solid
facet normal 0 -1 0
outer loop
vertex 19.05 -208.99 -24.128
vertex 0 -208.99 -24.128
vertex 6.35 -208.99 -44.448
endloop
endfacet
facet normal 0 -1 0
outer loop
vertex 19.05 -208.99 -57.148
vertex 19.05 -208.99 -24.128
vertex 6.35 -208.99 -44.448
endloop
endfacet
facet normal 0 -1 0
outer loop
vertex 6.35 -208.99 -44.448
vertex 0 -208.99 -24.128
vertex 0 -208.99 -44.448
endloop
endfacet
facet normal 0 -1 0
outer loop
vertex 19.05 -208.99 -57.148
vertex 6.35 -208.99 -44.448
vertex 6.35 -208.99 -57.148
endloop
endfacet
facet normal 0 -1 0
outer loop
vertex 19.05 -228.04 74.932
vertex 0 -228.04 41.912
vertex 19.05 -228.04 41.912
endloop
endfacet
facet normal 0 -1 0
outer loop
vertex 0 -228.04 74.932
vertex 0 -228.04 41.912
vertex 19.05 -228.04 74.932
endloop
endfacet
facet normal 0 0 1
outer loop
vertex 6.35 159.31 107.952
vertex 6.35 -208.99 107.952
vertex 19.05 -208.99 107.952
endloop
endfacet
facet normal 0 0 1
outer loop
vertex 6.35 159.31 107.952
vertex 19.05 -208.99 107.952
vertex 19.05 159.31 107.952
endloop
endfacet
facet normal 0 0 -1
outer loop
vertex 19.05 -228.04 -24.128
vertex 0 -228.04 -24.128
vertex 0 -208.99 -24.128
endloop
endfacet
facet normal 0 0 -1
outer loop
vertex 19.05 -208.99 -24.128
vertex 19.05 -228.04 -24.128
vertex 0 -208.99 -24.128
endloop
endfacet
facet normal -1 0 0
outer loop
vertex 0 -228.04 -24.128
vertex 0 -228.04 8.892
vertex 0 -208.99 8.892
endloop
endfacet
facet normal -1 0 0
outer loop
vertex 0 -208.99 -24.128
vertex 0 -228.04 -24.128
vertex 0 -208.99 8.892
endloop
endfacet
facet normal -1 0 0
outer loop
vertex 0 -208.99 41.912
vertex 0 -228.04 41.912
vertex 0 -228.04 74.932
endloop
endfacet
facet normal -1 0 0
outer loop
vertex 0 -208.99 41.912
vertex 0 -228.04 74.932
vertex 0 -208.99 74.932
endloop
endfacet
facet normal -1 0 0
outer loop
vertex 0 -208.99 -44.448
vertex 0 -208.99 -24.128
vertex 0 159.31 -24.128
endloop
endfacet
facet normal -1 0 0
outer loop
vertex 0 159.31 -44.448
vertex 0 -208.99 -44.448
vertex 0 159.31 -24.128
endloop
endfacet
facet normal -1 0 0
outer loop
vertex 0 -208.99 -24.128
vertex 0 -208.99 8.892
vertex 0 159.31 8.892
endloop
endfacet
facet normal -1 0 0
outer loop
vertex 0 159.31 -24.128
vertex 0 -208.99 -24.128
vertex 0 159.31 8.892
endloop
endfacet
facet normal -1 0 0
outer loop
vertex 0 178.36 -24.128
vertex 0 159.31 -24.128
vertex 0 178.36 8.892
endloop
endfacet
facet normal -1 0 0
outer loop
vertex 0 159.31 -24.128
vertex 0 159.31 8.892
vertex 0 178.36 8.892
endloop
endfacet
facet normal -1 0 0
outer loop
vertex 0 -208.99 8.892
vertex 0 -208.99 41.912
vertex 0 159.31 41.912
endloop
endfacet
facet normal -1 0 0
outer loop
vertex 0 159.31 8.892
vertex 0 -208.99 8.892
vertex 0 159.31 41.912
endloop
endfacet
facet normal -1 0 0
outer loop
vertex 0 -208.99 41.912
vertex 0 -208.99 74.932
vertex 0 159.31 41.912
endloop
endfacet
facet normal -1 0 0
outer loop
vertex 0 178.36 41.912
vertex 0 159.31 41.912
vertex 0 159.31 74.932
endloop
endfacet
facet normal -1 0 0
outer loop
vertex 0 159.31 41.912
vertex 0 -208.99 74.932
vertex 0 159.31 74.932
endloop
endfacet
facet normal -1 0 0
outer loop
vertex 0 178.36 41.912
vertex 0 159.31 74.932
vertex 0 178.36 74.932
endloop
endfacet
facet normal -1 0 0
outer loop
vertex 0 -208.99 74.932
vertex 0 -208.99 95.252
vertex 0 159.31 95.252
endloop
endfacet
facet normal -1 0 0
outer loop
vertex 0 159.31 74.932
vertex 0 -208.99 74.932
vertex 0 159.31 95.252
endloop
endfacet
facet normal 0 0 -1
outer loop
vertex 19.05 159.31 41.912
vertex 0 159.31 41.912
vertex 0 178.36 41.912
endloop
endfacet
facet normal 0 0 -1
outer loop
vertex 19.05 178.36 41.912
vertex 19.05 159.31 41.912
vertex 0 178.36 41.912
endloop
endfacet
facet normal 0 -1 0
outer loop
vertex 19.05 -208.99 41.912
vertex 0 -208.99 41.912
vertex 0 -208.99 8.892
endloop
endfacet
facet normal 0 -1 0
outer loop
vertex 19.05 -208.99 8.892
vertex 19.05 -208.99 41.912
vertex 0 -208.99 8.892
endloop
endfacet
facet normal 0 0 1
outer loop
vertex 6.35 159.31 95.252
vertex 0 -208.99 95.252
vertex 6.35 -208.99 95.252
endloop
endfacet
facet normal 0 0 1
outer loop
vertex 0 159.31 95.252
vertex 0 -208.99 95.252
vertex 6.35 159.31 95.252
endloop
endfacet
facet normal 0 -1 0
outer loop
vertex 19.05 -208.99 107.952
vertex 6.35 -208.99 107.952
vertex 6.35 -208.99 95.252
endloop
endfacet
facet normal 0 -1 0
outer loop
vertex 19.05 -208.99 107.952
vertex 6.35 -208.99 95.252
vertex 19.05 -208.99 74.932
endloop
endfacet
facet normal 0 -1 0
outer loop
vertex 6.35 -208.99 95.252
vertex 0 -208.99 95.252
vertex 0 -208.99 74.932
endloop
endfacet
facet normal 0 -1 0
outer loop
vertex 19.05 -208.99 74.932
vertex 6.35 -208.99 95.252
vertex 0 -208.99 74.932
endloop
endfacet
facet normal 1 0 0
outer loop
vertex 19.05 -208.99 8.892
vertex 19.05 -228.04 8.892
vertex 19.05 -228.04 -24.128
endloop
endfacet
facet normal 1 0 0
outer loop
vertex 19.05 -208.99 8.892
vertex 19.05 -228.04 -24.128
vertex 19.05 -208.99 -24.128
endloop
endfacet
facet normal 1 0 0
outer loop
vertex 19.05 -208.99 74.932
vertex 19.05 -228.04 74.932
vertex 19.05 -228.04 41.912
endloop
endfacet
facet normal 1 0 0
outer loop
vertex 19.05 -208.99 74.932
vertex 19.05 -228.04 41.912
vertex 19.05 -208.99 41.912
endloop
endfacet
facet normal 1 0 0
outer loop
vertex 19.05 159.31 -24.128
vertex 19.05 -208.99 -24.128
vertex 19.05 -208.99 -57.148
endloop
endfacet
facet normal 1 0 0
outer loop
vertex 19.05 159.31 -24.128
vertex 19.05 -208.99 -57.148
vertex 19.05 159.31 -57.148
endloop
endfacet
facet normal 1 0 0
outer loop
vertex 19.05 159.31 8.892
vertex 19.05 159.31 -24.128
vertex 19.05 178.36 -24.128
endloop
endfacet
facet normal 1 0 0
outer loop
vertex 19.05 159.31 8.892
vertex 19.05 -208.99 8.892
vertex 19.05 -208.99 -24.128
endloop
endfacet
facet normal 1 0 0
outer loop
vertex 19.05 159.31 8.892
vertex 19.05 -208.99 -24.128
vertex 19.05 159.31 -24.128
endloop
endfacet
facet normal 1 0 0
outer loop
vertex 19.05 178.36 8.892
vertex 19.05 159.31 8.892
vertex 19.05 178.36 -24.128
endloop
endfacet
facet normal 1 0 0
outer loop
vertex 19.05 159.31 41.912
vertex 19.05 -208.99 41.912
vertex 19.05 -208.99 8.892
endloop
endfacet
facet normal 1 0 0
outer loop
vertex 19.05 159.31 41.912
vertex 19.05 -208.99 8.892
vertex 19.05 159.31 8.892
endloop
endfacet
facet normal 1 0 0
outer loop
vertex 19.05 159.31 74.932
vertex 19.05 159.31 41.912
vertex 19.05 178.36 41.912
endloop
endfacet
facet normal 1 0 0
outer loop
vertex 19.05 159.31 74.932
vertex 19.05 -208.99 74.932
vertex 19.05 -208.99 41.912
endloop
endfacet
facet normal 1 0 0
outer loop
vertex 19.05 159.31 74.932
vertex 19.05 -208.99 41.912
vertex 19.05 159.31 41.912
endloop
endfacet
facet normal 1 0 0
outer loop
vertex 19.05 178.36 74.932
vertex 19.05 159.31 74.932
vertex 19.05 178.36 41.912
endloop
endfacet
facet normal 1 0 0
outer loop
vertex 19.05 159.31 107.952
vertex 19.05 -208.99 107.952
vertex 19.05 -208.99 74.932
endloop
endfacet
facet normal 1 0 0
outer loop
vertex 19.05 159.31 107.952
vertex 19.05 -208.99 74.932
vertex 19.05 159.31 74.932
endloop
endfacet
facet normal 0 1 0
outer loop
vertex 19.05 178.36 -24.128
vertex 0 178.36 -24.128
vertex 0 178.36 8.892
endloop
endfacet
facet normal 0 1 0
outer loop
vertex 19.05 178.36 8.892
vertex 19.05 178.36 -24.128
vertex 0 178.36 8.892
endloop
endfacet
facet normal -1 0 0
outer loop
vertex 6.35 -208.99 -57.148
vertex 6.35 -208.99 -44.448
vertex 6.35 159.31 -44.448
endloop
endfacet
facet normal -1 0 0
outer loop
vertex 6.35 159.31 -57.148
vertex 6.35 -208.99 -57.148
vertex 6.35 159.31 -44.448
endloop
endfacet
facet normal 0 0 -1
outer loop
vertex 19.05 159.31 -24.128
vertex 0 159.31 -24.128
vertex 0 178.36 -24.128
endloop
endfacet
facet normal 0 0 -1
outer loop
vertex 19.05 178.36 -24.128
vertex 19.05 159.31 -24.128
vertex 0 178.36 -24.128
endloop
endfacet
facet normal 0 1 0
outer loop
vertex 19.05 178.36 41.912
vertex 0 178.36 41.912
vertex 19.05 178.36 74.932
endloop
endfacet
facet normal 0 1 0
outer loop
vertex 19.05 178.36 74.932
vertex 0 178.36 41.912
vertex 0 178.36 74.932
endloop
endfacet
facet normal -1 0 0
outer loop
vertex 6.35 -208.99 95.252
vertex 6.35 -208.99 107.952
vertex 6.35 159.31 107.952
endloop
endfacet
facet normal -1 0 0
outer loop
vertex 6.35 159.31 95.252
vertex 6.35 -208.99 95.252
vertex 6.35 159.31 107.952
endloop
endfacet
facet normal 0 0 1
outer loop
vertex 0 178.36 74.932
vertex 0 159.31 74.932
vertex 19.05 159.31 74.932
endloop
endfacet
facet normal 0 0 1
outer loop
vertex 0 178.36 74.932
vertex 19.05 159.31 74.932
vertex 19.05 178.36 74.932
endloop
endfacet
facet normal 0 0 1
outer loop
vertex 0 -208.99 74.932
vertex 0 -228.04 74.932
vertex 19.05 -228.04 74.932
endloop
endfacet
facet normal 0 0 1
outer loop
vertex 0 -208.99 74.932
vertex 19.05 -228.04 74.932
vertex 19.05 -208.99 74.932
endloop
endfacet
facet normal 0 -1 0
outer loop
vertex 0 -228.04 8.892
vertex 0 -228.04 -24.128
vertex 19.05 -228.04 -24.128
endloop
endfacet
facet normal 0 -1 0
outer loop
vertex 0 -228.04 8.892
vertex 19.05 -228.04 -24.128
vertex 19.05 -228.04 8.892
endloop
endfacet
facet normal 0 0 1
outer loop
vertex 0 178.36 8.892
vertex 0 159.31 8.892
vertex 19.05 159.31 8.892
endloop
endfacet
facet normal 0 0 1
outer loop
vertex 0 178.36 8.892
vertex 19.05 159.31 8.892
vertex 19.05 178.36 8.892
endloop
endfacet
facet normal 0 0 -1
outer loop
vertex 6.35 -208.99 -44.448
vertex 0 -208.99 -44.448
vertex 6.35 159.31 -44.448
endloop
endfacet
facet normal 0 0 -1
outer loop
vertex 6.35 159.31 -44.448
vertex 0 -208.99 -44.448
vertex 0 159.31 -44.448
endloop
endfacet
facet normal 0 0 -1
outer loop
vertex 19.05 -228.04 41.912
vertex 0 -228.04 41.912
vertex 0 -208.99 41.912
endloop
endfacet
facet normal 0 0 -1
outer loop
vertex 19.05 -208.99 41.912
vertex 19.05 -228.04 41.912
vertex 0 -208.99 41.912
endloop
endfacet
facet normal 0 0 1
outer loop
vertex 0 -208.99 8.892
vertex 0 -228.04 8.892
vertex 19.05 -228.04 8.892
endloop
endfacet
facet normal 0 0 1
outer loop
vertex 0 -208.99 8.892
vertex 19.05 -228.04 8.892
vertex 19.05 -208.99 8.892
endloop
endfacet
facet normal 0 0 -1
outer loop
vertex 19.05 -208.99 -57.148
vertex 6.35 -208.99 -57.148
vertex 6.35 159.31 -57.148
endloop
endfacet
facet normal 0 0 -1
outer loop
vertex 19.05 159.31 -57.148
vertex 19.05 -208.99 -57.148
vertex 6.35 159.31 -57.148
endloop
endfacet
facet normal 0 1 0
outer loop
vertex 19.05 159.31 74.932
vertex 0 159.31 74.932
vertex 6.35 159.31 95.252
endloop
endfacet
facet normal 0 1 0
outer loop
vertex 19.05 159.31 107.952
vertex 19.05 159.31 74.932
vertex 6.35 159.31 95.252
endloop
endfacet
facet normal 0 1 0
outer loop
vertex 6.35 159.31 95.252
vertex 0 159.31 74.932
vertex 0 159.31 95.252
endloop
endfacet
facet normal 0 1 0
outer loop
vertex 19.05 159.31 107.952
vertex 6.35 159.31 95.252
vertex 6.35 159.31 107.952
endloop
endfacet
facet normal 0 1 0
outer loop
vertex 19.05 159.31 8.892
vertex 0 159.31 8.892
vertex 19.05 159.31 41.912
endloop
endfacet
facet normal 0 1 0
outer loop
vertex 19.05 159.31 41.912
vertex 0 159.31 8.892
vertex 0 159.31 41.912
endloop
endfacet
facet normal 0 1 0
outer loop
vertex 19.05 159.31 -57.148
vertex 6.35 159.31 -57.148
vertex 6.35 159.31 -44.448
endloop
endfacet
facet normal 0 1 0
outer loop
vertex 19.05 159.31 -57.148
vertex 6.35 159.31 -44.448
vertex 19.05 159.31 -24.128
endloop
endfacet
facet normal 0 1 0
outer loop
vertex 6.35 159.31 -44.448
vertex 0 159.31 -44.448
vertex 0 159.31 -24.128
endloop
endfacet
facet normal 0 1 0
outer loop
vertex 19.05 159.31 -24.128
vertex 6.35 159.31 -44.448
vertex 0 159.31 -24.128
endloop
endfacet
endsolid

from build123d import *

# Parameters (mm, degrees)
F0_W     = 368.3
F0_H     = 12.7
F0_W_2   = 19.05
F0_H_2   = 33.02
F1_DEPTH = 19.05
F2_DEPTH = 6.35
F3_DEPTH = 6.35


with BuildPart() as f1:
    # F0 (on Right) → F1 (new body)
    with BuildSketch(Plane.YZ):
        with Locations((-24.839816, 101.602047)):
            Rectangle(F0_W, F0_H)
        Polygon((159.310184, 95.252047), (-208.989816, 95.252047), (-208.989816, 74.932047), (-208.989816, 41.912047), (-208.989816, 8.892047), (-208.989816, -24.127953), (-208.989816, -44.447953), (159.310184, -44.447953), (159.310184, -24.127953), (159.310184, 8.892047), (159.310184, 41.912047), (159.310184, 74.932047), align=None)
        with Locations((-218.514816, 58.422047)):
            Rectangle(F0_W_2, F0_H_2)
        with Locations((168.835184, 58.422047)):
            Rectangle(F0_W_2, F0_H_2)
        with Locations((-218.514816, -7.617953)):
            Rectangle(F0_W_2, F0_H_2)
        with Locations((168.835184, -7.617953)):
            Rectangle(F0_W_2, F0_H_2)
        with Locations((-24.839816, -50.797953)):
            Rectangle(F0_W, F0_H)
    extrude(amount=F1_DEPTH)

    # F0 (on Right) → F2 (cut)
    with BuildSketch(Plane.YZ):
        with Locations((-24.839816, 101.602047)):
            Rectangle(F0_W, F0_H)
    extrude(amount=F2_DEPTH, mode=Mode.SUBTRACT)

    # F0 (on Right) → F3 (cut)
    with BuildSketch(Plane.YZ):
        with Locations((-24.839816, -50.797953)):
            Rectangle(F0_W, F0_H)
    extrude(amount=F3_DEPTH, mode=Mode.SUBTRACT)


solid = f1.part
